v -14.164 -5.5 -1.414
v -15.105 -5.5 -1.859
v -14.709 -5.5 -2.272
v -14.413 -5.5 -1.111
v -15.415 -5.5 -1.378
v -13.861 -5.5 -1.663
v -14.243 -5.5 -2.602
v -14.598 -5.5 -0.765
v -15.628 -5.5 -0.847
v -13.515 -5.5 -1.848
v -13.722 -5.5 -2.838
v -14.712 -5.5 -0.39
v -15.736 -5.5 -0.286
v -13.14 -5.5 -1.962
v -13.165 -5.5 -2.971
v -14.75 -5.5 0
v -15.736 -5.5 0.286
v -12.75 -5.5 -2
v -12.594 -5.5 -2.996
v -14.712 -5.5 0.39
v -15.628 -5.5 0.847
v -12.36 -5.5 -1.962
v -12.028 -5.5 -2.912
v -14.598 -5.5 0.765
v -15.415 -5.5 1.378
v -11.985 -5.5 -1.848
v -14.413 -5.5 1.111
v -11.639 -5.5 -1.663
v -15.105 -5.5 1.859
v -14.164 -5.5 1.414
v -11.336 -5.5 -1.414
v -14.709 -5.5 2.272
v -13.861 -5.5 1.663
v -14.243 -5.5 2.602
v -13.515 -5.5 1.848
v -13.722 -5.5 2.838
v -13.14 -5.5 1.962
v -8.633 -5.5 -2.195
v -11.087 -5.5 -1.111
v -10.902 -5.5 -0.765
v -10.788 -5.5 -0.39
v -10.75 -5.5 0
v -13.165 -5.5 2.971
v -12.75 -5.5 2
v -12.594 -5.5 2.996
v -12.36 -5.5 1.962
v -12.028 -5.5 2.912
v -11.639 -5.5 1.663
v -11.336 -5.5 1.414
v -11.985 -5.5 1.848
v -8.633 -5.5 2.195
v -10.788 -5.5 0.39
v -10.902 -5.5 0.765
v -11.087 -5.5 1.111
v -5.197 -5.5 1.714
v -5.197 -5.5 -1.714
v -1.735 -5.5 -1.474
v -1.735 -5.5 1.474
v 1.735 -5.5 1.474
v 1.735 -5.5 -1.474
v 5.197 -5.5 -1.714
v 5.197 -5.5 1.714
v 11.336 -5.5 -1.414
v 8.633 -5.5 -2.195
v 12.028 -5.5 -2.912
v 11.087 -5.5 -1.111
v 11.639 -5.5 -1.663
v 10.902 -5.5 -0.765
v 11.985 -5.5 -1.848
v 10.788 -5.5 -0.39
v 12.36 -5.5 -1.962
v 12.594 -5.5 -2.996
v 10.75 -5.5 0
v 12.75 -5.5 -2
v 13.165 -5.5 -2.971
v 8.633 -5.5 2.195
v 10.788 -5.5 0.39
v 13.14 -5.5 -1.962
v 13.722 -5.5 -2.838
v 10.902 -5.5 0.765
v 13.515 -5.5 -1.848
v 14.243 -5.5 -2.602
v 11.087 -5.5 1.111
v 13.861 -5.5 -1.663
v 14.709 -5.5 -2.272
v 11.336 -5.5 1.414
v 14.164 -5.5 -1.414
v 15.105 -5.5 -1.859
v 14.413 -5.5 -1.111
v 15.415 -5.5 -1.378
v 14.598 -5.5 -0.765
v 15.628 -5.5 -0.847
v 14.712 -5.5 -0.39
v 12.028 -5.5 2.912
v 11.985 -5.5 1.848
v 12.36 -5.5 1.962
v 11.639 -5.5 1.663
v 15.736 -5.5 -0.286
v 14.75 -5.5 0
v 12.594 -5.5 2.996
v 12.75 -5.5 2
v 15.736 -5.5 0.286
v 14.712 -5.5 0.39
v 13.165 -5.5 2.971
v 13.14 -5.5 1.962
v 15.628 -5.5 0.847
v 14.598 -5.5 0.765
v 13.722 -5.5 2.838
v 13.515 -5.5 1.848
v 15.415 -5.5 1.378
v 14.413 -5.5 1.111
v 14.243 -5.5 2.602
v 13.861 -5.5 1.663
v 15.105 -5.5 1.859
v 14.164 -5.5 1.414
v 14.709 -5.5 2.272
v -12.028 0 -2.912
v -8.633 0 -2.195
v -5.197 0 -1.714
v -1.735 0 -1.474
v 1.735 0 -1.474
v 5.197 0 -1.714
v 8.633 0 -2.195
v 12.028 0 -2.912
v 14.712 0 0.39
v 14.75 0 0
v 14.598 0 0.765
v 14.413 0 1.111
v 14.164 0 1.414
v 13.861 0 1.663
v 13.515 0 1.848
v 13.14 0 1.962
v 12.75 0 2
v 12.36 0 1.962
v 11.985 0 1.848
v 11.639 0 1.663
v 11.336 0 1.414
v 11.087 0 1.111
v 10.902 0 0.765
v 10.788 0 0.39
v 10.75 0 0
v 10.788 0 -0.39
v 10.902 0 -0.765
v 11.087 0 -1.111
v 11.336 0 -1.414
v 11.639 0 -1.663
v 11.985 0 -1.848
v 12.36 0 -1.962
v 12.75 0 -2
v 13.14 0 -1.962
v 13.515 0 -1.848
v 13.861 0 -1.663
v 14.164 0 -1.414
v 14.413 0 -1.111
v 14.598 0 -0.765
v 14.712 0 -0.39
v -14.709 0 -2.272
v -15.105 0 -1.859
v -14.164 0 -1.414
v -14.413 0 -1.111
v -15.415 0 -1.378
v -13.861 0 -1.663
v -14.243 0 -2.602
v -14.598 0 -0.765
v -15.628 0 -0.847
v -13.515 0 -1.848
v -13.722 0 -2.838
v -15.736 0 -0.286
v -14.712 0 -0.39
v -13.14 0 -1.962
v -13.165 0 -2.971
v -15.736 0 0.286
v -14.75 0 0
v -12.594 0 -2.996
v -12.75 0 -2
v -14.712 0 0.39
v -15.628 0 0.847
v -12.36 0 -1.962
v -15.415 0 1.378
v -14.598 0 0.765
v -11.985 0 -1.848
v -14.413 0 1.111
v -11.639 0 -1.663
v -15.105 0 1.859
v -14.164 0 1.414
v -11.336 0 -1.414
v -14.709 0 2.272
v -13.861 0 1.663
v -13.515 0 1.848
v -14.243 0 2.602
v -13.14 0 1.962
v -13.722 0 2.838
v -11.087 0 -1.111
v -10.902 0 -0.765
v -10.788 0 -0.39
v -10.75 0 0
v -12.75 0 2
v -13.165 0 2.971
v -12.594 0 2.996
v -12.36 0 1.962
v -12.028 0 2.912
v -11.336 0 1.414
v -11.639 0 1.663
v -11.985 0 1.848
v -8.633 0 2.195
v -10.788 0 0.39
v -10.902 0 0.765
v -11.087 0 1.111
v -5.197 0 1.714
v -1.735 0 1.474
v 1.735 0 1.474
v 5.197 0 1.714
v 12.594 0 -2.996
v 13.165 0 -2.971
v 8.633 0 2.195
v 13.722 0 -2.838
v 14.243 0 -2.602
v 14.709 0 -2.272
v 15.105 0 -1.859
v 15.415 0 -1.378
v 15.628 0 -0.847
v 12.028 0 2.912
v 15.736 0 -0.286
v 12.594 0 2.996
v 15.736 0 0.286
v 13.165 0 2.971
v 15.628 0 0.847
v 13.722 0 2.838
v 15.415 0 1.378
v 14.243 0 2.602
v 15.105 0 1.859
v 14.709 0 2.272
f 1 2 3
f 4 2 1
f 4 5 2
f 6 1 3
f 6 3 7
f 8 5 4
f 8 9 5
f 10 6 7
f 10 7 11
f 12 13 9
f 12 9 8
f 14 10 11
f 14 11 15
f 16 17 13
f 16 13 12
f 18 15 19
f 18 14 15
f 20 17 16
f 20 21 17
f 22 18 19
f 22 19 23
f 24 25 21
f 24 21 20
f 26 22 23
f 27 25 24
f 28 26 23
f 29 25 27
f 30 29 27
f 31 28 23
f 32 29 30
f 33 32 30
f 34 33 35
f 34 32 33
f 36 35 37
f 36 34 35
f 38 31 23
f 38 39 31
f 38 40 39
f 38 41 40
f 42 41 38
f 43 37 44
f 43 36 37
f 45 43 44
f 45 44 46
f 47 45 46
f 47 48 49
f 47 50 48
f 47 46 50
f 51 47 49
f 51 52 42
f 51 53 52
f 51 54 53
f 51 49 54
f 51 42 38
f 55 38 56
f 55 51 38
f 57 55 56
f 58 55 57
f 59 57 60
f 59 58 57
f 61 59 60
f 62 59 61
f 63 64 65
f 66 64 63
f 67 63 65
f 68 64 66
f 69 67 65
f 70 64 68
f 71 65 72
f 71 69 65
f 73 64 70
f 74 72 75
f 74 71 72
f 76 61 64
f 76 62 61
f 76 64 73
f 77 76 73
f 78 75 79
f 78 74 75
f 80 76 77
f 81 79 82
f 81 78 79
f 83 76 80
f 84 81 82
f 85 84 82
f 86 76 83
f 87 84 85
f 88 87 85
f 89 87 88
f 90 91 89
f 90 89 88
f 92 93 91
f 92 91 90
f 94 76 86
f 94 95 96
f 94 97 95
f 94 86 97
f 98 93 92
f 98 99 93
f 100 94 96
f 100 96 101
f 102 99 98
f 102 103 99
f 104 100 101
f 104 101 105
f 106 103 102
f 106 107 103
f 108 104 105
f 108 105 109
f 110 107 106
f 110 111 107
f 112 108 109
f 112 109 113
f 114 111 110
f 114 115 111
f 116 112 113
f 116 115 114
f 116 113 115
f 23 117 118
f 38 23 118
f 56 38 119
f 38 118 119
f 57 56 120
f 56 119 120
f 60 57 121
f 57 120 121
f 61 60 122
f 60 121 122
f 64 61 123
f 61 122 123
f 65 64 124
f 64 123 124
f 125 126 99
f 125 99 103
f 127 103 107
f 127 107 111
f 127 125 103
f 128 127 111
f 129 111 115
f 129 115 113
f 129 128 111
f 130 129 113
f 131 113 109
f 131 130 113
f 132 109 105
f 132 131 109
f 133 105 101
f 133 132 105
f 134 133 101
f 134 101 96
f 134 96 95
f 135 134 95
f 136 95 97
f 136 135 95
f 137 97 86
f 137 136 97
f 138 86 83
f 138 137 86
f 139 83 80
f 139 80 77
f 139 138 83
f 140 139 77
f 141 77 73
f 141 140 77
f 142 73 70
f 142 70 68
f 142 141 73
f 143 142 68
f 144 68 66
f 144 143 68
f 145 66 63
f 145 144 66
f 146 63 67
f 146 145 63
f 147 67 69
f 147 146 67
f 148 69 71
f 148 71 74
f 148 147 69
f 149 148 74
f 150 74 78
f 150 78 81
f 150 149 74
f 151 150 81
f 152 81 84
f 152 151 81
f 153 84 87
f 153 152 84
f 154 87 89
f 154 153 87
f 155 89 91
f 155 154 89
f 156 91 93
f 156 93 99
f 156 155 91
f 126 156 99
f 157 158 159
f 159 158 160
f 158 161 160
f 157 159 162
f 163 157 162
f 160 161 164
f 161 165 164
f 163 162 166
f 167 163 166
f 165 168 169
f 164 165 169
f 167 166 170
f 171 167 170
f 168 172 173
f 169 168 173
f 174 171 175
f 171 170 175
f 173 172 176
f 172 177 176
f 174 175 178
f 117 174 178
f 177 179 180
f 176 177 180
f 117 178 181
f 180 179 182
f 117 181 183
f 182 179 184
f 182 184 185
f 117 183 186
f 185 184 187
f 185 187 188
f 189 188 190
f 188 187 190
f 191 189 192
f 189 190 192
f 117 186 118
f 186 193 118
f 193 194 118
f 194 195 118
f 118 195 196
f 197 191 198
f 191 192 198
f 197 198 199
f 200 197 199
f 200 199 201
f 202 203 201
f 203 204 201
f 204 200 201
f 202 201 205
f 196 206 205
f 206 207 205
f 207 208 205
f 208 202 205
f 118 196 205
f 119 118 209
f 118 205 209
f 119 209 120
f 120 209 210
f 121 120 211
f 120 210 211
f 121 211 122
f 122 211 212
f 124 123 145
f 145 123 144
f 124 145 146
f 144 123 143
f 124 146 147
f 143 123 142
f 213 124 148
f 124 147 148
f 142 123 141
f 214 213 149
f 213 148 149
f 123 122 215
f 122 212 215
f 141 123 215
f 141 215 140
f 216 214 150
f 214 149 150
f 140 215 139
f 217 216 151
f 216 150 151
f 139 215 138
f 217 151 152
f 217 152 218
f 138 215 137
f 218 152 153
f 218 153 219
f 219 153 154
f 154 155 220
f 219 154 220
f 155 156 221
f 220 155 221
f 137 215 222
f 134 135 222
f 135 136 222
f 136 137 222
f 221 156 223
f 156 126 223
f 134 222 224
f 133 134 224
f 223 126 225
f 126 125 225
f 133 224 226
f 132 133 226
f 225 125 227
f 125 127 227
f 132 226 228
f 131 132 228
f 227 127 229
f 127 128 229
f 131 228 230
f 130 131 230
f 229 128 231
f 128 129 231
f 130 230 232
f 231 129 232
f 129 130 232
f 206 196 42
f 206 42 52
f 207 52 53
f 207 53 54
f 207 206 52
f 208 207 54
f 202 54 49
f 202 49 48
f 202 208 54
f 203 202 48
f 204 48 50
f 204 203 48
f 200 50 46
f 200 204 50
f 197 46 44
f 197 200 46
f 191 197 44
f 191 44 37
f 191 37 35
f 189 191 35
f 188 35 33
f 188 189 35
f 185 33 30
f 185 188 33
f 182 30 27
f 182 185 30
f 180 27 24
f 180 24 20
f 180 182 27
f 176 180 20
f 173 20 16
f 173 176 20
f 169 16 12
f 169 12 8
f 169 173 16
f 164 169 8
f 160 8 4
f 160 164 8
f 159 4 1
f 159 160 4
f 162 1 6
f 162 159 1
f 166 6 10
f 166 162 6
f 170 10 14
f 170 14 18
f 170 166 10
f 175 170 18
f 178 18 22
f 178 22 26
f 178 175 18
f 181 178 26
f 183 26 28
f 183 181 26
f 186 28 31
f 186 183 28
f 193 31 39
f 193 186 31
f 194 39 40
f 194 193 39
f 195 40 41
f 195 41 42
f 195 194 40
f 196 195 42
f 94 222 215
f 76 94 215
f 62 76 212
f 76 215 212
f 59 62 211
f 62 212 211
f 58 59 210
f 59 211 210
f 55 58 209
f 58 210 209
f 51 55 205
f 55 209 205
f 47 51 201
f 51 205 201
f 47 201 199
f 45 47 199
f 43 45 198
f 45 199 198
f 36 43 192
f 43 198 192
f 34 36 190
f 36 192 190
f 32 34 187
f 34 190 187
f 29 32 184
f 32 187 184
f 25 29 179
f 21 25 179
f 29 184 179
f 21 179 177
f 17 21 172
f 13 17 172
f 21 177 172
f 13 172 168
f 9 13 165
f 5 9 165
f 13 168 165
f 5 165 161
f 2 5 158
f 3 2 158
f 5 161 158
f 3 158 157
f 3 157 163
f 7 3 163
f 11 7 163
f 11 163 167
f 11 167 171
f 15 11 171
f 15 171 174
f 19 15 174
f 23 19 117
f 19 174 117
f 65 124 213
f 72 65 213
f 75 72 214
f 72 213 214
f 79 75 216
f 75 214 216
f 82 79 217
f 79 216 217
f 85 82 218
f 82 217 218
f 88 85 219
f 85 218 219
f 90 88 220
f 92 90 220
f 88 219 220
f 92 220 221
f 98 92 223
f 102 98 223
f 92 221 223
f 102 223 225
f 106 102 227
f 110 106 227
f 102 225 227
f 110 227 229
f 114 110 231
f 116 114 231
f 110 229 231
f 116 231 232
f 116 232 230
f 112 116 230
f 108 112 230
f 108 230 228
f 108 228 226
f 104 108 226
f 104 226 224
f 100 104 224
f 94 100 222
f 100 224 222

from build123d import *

# Parameters (mm, degrees)
F0_R     = 2
F1_DEPTH = 5.5


with BuildPart() as f1:
    # F0 (on Front) → F1 (new body)
    with BuildSketch(Plane.XZ):
        with BuildLine():
            ThreePointArc((-12.028302, -2.911898), (0, -1.443537), (12.028302, -2.911898))
            ThreePointArc((12.028302, -2.911898), (15.75, 0), (12.028302, 2.911898))
            ThreePointArc((12.028302, 2.911898), (0, 1.443537), (-12.028302, 2.911898))
            ThreePointArc((-12.028302, 2.911898), (-15.75, 0), (-12.028302, -2.911898))
        make_face()
        with Locations((-12.75, 0)):
            Circle(F0_R, mode=Mode.SUBTRACT)
        with Locations((12.75, 0)):
            Circle(F0_R, mode=Mode.SUBTRACT)
    extrude(amount=F1_DEPTH)


solid = f1.part
